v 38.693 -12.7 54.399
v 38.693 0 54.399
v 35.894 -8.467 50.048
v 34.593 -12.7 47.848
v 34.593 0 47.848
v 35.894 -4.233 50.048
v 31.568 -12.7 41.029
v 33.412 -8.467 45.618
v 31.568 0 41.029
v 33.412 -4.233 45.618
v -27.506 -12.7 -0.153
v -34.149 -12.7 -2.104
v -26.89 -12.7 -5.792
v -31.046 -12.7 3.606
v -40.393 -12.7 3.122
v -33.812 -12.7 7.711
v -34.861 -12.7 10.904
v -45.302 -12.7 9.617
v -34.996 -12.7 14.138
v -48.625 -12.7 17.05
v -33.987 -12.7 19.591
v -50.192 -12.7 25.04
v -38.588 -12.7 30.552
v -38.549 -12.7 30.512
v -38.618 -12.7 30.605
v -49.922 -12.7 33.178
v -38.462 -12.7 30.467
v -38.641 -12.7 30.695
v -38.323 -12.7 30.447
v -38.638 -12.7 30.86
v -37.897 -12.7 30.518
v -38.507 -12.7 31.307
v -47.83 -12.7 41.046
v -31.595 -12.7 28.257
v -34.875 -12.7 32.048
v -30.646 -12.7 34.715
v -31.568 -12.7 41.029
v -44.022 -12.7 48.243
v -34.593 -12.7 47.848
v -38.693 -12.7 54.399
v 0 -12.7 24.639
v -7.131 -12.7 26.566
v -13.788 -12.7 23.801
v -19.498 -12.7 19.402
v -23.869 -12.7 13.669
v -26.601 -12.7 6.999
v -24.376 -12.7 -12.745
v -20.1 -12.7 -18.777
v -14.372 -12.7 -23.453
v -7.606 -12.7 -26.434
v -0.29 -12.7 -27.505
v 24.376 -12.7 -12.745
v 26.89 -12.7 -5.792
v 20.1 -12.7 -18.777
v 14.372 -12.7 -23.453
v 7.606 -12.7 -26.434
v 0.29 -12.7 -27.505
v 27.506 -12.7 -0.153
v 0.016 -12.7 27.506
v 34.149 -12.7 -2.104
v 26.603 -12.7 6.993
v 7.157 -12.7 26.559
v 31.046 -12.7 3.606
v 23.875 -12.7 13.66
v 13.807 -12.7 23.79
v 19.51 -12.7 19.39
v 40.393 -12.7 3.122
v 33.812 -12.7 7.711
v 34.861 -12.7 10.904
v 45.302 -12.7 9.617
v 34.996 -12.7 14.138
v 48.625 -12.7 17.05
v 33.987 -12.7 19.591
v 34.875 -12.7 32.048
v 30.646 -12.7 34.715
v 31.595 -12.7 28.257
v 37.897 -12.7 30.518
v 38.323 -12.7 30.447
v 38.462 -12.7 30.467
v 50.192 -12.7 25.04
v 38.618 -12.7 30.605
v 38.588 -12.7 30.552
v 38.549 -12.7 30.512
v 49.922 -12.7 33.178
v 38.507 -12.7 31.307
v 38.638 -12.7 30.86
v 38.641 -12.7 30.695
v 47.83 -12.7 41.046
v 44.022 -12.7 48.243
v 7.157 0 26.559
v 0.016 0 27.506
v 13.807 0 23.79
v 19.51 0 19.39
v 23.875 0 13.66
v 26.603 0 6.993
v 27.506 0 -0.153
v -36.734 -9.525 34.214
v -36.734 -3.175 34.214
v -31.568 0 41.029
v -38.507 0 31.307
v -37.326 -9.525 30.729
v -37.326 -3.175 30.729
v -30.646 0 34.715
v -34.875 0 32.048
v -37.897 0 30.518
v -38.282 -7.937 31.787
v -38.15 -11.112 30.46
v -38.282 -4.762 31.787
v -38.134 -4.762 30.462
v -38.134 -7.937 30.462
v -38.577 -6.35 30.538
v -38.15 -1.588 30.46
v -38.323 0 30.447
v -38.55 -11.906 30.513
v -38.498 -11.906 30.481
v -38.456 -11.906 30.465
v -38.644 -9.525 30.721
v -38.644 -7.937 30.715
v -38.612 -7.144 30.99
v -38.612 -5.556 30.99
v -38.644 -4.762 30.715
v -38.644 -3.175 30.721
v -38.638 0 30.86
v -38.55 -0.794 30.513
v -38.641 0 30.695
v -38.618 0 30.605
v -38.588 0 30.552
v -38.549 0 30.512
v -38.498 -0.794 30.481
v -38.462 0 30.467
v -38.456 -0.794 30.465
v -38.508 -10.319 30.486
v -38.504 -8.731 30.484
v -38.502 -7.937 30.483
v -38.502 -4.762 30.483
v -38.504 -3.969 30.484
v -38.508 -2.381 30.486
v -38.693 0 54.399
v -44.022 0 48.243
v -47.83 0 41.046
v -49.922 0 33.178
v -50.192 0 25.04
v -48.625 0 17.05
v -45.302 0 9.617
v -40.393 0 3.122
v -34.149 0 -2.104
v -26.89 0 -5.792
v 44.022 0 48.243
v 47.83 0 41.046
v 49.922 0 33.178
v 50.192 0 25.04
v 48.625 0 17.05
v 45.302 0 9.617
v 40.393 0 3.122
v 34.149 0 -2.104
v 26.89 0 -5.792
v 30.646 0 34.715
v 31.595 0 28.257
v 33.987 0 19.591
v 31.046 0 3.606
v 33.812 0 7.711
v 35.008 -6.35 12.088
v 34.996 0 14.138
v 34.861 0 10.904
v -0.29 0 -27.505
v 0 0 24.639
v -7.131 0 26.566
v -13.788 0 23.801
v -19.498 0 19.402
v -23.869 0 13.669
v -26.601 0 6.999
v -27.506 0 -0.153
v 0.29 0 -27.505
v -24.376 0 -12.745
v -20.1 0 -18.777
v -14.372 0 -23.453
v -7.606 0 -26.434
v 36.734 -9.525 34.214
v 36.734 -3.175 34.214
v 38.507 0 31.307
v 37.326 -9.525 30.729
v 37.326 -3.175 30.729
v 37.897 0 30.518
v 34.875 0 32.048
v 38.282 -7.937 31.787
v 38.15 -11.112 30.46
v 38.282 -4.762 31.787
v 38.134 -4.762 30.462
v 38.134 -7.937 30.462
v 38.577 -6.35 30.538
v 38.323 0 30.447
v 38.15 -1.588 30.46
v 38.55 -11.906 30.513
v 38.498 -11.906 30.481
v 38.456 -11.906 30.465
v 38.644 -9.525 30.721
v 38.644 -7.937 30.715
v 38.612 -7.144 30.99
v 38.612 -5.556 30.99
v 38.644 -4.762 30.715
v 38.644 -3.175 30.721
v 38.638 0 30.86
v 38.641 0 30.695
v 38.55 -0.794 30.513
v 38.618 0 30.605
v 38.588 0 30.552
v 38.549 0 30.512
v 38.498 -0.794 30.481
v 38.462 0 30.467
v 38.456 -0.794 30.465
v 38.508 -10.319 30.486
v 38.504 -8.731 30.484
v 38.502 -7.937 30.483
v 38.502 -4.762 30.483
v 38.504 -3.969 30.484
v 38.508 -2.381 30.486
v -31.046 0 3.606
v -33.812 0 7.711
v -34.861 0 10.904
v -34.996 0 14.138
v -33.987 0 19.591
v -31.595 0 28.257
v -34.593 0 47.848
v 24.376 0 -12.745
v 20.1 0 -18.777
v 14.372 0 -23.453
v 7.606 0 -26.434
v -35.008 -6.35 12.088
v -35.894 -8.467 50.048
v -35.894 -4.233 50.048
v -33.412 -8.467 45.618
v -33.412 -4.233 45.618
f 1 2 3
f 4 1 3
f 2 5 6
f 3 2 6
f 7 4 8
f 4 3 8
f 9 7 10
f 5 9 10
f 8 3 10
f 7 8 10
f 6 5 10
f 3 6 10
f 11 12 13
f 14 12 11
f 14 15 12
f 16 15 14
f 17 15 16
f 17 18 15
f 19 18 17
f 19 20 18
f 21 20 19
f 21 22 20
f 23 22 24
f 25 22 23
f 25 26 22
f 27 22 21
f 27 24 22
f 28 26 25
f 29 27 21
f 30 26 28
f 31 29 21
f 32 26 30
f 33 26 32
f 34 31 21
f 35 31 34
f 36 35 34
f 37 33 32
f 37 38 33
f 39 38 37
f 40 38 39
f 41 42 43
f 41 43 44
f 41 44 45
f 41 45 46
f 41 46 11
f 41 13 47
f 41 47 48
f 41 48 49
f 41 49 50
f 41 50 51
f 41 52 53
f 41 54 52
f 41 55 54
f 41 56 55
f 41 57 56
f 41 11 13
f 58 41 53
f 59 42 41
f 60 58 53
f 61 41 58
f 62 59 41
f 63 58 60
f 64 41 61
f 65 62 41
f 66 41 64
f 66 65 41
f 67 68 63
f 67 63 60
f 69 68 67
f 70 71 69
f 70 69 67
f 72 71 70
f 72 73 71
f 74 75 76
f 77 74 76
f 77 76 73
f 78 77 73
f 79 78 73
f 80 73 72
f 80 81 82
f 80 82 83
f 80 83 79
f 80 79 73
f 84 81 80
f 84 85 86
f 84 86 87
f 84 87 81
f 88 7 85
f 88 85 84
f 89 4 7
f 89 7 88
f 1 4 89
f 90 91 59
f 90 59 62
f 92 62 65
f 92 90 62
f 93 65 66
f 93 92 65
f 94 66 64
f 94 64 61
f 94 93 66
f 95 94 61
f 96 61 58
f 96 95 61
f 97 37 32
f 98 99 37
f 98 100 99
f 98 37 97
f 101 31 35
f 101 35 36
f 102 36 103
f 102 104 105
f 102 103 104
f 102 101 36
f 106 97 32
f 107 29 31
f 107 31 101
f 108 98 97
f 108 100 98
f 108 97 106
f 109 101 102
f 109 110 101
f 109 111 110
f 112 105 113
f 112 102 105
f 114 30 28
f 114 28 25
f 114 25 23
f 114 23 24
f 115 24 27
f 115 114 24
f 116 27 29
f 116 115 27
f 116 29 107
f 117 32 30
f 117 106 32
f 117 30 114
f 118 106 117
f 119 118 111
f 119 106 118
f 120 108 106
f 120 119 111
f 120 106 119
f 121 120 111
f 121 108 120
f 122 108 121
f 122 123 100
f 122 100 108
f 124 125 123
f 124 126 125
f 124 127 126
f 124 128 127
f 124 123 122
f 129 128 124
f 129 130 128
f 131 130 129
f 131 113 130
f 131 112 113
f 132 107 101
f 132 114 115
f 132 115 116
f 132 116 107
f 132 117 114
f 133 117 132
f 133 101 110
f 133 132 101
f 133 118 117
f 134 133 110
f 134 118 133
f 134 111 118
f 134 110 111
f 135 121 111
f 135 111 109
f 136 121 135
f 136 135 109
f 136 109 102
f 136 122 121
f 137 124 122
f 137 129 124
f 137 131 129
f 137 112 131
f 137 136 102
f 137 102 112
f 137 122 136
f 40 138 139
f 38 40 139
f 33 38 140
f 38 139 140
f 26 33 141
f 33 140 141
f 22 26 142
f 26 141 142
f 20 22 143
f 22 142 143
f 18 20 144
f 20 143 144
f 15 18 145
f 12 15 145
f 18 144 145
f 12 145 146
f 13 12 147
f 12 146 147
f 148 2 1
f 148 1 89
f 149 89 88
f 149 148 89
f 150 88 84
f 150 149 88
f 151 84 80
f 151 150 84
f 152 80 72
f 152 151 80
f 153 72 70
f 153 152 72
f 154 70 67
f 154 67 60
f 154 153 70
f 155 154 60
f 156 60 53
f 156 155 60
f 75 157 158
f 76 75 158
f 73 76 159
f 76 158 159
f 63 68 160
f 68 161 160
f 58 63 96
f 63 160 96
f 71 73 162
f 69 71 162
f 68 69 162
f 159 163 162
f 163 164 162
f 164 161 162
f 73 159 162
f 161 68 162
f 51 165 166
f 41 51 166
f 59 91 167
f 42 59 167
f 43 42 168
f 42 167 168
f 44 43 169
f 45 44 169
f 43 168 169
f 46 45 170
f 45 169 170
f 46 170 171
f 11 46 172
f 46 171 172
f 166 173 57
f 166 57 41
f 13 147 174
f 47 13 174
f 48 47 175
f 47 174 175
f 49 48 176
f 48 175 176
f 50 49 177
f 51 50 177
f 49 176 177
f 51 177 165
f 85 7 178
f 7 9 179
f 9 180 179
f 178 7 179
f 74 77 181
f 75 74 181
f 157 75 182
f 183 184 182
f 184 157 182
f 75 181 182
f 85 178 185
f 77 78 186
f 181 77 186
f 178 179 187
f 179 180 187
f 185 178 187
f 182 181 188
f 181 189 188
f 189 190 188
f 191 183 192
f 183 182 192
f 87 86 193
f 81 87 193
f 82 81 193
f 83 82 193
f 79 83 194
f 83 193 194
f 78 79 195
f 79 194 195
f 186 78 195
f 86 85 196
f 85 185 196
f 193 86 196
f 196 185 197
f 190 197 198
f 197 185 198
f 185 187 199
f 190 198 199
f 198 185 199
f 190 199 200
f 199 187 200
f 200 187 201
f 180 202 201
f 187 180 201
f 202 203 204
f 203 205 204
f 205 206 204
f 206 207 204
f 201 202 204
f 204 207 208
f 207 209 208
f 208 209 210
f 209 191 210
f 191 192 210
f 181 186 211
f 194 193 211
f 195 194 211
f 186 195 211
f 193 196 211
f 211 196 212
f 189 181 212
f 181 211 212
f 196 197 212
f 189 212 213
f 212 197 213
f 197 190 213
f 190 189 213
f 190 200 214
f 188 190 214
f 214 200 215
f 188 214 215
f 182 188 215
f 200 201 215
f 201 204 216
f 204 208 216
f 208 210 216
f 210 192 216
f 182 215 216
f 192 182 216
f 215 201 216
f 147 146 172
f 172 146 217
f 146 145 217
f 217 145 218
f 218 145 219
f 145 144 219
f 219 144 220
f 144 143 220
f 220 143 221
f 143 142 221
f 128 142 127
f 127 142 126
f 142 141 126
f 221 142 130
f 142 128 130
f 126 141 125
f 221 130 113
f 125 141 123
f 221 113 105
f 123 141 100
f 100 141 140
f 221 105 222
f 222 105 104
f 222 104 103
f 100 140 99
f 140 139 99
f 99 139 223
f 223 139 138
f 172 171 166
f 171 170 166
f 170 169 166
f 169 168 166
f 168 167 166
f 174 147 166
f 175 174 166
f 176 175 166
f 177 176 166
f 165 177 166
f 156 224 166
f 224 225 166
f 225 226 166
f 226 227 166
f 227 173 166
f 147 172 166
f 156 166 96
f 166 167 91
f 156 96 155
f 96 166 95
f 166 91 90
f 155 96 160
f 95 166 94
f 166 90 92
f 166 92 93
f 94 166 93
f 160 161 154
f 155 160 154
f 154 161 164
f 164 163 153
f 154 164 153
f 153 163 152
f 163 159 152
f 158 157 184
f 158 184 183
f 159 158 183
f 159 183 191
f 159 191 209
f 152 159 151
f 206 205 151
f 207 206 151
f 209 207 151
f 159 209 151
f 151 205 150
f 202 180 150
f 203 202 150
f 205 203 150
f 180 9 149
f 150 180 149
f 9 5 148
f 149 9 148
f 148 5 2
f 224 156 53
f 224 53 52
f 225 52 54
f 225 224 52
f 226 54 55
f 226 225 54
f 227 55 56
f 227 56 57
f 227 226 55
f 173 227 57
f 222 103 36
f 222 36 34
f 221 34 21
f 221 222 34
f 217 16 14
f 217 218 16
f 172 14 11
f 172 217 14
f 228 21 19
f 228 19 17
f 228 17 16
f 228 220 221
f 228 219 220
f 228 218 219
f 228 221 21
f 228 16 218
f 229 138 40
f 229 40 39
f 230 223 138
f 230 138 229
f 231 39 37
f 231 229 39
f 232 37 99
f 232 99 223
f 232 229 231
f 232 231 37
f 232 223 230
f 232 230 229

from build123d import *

# Parameters (mm, degrees)
F1_DEPTH = 12.7


with BuildPart() as f1:
    # F0 (on Front) → F1 (new body)
    with BuildSketch(Plane.XZ):
        with BuildLine():
            add(Edge.make_bspline(
                [(-38.6931858957, 54.3991737068), (-35.8405403413, 50.0610999657), (-32.9878947868, 45.7230262247), (-31.5682335133, 41.0291340153)],
                knots=[0, 0, 0, 0, 0.2439114114, 0.2439114114, 0.2439114114, 0.2439114114], degree=3))
            ThreePointArc((-38.6931858957, 54.3991737068), (-49.6350522053, 21.0007464247), (-26.8898194638, -5.7916736001))
            ThreePointArc((-26.8898194638, -5.7916736001), (-17.3939863098, -21.3085690308), (-0.2898975187, -27.5049419798))
            Line((-0.2898975187, -27.5049419798), (0.0159435843, 27.5064650525))
            ThreePointArc((0.0159435843, 27.5064650525), (-19.4983805085, 19.401521369), (-27.5060445831, -0.1529224477))
            add(Edge.make_bspline(
                [(-30.6462217122, 34.7148962319), (-30.7754650722, 27.1593597), (-39.1689548904, 11.6131795075), (-31.0760950053, 3.448715235), (-27.5060445831, -0.1529224477)],
                knots=[0.3493301375, 0.3493301375, 0.3493301375, 0.3493301375, 0.7129662134, 1, 1, 1, 1], degree=3))
            add(Edge.make_bspline(
                [(-31.5682335133, 41.0291340153), (-35.3674367785, 36.1399617518), (-42.4430865557, 27.1135638958), (-34.3396168251, 32.3313583593), (-30.6462217122, 34.7148962319)],
                knots=[0, 0, 0, 0, 0.5426319314, 1, 1, 1, 1], degree=3))
        make_face()
    extrude(amount=F1_DEPTH)

    # F2: F1 across plane


with BuildPart() as f1_1:
    add(f1.part)
    add(f1.part.mirror(Plane.YZ))


solid = f1_1.part
